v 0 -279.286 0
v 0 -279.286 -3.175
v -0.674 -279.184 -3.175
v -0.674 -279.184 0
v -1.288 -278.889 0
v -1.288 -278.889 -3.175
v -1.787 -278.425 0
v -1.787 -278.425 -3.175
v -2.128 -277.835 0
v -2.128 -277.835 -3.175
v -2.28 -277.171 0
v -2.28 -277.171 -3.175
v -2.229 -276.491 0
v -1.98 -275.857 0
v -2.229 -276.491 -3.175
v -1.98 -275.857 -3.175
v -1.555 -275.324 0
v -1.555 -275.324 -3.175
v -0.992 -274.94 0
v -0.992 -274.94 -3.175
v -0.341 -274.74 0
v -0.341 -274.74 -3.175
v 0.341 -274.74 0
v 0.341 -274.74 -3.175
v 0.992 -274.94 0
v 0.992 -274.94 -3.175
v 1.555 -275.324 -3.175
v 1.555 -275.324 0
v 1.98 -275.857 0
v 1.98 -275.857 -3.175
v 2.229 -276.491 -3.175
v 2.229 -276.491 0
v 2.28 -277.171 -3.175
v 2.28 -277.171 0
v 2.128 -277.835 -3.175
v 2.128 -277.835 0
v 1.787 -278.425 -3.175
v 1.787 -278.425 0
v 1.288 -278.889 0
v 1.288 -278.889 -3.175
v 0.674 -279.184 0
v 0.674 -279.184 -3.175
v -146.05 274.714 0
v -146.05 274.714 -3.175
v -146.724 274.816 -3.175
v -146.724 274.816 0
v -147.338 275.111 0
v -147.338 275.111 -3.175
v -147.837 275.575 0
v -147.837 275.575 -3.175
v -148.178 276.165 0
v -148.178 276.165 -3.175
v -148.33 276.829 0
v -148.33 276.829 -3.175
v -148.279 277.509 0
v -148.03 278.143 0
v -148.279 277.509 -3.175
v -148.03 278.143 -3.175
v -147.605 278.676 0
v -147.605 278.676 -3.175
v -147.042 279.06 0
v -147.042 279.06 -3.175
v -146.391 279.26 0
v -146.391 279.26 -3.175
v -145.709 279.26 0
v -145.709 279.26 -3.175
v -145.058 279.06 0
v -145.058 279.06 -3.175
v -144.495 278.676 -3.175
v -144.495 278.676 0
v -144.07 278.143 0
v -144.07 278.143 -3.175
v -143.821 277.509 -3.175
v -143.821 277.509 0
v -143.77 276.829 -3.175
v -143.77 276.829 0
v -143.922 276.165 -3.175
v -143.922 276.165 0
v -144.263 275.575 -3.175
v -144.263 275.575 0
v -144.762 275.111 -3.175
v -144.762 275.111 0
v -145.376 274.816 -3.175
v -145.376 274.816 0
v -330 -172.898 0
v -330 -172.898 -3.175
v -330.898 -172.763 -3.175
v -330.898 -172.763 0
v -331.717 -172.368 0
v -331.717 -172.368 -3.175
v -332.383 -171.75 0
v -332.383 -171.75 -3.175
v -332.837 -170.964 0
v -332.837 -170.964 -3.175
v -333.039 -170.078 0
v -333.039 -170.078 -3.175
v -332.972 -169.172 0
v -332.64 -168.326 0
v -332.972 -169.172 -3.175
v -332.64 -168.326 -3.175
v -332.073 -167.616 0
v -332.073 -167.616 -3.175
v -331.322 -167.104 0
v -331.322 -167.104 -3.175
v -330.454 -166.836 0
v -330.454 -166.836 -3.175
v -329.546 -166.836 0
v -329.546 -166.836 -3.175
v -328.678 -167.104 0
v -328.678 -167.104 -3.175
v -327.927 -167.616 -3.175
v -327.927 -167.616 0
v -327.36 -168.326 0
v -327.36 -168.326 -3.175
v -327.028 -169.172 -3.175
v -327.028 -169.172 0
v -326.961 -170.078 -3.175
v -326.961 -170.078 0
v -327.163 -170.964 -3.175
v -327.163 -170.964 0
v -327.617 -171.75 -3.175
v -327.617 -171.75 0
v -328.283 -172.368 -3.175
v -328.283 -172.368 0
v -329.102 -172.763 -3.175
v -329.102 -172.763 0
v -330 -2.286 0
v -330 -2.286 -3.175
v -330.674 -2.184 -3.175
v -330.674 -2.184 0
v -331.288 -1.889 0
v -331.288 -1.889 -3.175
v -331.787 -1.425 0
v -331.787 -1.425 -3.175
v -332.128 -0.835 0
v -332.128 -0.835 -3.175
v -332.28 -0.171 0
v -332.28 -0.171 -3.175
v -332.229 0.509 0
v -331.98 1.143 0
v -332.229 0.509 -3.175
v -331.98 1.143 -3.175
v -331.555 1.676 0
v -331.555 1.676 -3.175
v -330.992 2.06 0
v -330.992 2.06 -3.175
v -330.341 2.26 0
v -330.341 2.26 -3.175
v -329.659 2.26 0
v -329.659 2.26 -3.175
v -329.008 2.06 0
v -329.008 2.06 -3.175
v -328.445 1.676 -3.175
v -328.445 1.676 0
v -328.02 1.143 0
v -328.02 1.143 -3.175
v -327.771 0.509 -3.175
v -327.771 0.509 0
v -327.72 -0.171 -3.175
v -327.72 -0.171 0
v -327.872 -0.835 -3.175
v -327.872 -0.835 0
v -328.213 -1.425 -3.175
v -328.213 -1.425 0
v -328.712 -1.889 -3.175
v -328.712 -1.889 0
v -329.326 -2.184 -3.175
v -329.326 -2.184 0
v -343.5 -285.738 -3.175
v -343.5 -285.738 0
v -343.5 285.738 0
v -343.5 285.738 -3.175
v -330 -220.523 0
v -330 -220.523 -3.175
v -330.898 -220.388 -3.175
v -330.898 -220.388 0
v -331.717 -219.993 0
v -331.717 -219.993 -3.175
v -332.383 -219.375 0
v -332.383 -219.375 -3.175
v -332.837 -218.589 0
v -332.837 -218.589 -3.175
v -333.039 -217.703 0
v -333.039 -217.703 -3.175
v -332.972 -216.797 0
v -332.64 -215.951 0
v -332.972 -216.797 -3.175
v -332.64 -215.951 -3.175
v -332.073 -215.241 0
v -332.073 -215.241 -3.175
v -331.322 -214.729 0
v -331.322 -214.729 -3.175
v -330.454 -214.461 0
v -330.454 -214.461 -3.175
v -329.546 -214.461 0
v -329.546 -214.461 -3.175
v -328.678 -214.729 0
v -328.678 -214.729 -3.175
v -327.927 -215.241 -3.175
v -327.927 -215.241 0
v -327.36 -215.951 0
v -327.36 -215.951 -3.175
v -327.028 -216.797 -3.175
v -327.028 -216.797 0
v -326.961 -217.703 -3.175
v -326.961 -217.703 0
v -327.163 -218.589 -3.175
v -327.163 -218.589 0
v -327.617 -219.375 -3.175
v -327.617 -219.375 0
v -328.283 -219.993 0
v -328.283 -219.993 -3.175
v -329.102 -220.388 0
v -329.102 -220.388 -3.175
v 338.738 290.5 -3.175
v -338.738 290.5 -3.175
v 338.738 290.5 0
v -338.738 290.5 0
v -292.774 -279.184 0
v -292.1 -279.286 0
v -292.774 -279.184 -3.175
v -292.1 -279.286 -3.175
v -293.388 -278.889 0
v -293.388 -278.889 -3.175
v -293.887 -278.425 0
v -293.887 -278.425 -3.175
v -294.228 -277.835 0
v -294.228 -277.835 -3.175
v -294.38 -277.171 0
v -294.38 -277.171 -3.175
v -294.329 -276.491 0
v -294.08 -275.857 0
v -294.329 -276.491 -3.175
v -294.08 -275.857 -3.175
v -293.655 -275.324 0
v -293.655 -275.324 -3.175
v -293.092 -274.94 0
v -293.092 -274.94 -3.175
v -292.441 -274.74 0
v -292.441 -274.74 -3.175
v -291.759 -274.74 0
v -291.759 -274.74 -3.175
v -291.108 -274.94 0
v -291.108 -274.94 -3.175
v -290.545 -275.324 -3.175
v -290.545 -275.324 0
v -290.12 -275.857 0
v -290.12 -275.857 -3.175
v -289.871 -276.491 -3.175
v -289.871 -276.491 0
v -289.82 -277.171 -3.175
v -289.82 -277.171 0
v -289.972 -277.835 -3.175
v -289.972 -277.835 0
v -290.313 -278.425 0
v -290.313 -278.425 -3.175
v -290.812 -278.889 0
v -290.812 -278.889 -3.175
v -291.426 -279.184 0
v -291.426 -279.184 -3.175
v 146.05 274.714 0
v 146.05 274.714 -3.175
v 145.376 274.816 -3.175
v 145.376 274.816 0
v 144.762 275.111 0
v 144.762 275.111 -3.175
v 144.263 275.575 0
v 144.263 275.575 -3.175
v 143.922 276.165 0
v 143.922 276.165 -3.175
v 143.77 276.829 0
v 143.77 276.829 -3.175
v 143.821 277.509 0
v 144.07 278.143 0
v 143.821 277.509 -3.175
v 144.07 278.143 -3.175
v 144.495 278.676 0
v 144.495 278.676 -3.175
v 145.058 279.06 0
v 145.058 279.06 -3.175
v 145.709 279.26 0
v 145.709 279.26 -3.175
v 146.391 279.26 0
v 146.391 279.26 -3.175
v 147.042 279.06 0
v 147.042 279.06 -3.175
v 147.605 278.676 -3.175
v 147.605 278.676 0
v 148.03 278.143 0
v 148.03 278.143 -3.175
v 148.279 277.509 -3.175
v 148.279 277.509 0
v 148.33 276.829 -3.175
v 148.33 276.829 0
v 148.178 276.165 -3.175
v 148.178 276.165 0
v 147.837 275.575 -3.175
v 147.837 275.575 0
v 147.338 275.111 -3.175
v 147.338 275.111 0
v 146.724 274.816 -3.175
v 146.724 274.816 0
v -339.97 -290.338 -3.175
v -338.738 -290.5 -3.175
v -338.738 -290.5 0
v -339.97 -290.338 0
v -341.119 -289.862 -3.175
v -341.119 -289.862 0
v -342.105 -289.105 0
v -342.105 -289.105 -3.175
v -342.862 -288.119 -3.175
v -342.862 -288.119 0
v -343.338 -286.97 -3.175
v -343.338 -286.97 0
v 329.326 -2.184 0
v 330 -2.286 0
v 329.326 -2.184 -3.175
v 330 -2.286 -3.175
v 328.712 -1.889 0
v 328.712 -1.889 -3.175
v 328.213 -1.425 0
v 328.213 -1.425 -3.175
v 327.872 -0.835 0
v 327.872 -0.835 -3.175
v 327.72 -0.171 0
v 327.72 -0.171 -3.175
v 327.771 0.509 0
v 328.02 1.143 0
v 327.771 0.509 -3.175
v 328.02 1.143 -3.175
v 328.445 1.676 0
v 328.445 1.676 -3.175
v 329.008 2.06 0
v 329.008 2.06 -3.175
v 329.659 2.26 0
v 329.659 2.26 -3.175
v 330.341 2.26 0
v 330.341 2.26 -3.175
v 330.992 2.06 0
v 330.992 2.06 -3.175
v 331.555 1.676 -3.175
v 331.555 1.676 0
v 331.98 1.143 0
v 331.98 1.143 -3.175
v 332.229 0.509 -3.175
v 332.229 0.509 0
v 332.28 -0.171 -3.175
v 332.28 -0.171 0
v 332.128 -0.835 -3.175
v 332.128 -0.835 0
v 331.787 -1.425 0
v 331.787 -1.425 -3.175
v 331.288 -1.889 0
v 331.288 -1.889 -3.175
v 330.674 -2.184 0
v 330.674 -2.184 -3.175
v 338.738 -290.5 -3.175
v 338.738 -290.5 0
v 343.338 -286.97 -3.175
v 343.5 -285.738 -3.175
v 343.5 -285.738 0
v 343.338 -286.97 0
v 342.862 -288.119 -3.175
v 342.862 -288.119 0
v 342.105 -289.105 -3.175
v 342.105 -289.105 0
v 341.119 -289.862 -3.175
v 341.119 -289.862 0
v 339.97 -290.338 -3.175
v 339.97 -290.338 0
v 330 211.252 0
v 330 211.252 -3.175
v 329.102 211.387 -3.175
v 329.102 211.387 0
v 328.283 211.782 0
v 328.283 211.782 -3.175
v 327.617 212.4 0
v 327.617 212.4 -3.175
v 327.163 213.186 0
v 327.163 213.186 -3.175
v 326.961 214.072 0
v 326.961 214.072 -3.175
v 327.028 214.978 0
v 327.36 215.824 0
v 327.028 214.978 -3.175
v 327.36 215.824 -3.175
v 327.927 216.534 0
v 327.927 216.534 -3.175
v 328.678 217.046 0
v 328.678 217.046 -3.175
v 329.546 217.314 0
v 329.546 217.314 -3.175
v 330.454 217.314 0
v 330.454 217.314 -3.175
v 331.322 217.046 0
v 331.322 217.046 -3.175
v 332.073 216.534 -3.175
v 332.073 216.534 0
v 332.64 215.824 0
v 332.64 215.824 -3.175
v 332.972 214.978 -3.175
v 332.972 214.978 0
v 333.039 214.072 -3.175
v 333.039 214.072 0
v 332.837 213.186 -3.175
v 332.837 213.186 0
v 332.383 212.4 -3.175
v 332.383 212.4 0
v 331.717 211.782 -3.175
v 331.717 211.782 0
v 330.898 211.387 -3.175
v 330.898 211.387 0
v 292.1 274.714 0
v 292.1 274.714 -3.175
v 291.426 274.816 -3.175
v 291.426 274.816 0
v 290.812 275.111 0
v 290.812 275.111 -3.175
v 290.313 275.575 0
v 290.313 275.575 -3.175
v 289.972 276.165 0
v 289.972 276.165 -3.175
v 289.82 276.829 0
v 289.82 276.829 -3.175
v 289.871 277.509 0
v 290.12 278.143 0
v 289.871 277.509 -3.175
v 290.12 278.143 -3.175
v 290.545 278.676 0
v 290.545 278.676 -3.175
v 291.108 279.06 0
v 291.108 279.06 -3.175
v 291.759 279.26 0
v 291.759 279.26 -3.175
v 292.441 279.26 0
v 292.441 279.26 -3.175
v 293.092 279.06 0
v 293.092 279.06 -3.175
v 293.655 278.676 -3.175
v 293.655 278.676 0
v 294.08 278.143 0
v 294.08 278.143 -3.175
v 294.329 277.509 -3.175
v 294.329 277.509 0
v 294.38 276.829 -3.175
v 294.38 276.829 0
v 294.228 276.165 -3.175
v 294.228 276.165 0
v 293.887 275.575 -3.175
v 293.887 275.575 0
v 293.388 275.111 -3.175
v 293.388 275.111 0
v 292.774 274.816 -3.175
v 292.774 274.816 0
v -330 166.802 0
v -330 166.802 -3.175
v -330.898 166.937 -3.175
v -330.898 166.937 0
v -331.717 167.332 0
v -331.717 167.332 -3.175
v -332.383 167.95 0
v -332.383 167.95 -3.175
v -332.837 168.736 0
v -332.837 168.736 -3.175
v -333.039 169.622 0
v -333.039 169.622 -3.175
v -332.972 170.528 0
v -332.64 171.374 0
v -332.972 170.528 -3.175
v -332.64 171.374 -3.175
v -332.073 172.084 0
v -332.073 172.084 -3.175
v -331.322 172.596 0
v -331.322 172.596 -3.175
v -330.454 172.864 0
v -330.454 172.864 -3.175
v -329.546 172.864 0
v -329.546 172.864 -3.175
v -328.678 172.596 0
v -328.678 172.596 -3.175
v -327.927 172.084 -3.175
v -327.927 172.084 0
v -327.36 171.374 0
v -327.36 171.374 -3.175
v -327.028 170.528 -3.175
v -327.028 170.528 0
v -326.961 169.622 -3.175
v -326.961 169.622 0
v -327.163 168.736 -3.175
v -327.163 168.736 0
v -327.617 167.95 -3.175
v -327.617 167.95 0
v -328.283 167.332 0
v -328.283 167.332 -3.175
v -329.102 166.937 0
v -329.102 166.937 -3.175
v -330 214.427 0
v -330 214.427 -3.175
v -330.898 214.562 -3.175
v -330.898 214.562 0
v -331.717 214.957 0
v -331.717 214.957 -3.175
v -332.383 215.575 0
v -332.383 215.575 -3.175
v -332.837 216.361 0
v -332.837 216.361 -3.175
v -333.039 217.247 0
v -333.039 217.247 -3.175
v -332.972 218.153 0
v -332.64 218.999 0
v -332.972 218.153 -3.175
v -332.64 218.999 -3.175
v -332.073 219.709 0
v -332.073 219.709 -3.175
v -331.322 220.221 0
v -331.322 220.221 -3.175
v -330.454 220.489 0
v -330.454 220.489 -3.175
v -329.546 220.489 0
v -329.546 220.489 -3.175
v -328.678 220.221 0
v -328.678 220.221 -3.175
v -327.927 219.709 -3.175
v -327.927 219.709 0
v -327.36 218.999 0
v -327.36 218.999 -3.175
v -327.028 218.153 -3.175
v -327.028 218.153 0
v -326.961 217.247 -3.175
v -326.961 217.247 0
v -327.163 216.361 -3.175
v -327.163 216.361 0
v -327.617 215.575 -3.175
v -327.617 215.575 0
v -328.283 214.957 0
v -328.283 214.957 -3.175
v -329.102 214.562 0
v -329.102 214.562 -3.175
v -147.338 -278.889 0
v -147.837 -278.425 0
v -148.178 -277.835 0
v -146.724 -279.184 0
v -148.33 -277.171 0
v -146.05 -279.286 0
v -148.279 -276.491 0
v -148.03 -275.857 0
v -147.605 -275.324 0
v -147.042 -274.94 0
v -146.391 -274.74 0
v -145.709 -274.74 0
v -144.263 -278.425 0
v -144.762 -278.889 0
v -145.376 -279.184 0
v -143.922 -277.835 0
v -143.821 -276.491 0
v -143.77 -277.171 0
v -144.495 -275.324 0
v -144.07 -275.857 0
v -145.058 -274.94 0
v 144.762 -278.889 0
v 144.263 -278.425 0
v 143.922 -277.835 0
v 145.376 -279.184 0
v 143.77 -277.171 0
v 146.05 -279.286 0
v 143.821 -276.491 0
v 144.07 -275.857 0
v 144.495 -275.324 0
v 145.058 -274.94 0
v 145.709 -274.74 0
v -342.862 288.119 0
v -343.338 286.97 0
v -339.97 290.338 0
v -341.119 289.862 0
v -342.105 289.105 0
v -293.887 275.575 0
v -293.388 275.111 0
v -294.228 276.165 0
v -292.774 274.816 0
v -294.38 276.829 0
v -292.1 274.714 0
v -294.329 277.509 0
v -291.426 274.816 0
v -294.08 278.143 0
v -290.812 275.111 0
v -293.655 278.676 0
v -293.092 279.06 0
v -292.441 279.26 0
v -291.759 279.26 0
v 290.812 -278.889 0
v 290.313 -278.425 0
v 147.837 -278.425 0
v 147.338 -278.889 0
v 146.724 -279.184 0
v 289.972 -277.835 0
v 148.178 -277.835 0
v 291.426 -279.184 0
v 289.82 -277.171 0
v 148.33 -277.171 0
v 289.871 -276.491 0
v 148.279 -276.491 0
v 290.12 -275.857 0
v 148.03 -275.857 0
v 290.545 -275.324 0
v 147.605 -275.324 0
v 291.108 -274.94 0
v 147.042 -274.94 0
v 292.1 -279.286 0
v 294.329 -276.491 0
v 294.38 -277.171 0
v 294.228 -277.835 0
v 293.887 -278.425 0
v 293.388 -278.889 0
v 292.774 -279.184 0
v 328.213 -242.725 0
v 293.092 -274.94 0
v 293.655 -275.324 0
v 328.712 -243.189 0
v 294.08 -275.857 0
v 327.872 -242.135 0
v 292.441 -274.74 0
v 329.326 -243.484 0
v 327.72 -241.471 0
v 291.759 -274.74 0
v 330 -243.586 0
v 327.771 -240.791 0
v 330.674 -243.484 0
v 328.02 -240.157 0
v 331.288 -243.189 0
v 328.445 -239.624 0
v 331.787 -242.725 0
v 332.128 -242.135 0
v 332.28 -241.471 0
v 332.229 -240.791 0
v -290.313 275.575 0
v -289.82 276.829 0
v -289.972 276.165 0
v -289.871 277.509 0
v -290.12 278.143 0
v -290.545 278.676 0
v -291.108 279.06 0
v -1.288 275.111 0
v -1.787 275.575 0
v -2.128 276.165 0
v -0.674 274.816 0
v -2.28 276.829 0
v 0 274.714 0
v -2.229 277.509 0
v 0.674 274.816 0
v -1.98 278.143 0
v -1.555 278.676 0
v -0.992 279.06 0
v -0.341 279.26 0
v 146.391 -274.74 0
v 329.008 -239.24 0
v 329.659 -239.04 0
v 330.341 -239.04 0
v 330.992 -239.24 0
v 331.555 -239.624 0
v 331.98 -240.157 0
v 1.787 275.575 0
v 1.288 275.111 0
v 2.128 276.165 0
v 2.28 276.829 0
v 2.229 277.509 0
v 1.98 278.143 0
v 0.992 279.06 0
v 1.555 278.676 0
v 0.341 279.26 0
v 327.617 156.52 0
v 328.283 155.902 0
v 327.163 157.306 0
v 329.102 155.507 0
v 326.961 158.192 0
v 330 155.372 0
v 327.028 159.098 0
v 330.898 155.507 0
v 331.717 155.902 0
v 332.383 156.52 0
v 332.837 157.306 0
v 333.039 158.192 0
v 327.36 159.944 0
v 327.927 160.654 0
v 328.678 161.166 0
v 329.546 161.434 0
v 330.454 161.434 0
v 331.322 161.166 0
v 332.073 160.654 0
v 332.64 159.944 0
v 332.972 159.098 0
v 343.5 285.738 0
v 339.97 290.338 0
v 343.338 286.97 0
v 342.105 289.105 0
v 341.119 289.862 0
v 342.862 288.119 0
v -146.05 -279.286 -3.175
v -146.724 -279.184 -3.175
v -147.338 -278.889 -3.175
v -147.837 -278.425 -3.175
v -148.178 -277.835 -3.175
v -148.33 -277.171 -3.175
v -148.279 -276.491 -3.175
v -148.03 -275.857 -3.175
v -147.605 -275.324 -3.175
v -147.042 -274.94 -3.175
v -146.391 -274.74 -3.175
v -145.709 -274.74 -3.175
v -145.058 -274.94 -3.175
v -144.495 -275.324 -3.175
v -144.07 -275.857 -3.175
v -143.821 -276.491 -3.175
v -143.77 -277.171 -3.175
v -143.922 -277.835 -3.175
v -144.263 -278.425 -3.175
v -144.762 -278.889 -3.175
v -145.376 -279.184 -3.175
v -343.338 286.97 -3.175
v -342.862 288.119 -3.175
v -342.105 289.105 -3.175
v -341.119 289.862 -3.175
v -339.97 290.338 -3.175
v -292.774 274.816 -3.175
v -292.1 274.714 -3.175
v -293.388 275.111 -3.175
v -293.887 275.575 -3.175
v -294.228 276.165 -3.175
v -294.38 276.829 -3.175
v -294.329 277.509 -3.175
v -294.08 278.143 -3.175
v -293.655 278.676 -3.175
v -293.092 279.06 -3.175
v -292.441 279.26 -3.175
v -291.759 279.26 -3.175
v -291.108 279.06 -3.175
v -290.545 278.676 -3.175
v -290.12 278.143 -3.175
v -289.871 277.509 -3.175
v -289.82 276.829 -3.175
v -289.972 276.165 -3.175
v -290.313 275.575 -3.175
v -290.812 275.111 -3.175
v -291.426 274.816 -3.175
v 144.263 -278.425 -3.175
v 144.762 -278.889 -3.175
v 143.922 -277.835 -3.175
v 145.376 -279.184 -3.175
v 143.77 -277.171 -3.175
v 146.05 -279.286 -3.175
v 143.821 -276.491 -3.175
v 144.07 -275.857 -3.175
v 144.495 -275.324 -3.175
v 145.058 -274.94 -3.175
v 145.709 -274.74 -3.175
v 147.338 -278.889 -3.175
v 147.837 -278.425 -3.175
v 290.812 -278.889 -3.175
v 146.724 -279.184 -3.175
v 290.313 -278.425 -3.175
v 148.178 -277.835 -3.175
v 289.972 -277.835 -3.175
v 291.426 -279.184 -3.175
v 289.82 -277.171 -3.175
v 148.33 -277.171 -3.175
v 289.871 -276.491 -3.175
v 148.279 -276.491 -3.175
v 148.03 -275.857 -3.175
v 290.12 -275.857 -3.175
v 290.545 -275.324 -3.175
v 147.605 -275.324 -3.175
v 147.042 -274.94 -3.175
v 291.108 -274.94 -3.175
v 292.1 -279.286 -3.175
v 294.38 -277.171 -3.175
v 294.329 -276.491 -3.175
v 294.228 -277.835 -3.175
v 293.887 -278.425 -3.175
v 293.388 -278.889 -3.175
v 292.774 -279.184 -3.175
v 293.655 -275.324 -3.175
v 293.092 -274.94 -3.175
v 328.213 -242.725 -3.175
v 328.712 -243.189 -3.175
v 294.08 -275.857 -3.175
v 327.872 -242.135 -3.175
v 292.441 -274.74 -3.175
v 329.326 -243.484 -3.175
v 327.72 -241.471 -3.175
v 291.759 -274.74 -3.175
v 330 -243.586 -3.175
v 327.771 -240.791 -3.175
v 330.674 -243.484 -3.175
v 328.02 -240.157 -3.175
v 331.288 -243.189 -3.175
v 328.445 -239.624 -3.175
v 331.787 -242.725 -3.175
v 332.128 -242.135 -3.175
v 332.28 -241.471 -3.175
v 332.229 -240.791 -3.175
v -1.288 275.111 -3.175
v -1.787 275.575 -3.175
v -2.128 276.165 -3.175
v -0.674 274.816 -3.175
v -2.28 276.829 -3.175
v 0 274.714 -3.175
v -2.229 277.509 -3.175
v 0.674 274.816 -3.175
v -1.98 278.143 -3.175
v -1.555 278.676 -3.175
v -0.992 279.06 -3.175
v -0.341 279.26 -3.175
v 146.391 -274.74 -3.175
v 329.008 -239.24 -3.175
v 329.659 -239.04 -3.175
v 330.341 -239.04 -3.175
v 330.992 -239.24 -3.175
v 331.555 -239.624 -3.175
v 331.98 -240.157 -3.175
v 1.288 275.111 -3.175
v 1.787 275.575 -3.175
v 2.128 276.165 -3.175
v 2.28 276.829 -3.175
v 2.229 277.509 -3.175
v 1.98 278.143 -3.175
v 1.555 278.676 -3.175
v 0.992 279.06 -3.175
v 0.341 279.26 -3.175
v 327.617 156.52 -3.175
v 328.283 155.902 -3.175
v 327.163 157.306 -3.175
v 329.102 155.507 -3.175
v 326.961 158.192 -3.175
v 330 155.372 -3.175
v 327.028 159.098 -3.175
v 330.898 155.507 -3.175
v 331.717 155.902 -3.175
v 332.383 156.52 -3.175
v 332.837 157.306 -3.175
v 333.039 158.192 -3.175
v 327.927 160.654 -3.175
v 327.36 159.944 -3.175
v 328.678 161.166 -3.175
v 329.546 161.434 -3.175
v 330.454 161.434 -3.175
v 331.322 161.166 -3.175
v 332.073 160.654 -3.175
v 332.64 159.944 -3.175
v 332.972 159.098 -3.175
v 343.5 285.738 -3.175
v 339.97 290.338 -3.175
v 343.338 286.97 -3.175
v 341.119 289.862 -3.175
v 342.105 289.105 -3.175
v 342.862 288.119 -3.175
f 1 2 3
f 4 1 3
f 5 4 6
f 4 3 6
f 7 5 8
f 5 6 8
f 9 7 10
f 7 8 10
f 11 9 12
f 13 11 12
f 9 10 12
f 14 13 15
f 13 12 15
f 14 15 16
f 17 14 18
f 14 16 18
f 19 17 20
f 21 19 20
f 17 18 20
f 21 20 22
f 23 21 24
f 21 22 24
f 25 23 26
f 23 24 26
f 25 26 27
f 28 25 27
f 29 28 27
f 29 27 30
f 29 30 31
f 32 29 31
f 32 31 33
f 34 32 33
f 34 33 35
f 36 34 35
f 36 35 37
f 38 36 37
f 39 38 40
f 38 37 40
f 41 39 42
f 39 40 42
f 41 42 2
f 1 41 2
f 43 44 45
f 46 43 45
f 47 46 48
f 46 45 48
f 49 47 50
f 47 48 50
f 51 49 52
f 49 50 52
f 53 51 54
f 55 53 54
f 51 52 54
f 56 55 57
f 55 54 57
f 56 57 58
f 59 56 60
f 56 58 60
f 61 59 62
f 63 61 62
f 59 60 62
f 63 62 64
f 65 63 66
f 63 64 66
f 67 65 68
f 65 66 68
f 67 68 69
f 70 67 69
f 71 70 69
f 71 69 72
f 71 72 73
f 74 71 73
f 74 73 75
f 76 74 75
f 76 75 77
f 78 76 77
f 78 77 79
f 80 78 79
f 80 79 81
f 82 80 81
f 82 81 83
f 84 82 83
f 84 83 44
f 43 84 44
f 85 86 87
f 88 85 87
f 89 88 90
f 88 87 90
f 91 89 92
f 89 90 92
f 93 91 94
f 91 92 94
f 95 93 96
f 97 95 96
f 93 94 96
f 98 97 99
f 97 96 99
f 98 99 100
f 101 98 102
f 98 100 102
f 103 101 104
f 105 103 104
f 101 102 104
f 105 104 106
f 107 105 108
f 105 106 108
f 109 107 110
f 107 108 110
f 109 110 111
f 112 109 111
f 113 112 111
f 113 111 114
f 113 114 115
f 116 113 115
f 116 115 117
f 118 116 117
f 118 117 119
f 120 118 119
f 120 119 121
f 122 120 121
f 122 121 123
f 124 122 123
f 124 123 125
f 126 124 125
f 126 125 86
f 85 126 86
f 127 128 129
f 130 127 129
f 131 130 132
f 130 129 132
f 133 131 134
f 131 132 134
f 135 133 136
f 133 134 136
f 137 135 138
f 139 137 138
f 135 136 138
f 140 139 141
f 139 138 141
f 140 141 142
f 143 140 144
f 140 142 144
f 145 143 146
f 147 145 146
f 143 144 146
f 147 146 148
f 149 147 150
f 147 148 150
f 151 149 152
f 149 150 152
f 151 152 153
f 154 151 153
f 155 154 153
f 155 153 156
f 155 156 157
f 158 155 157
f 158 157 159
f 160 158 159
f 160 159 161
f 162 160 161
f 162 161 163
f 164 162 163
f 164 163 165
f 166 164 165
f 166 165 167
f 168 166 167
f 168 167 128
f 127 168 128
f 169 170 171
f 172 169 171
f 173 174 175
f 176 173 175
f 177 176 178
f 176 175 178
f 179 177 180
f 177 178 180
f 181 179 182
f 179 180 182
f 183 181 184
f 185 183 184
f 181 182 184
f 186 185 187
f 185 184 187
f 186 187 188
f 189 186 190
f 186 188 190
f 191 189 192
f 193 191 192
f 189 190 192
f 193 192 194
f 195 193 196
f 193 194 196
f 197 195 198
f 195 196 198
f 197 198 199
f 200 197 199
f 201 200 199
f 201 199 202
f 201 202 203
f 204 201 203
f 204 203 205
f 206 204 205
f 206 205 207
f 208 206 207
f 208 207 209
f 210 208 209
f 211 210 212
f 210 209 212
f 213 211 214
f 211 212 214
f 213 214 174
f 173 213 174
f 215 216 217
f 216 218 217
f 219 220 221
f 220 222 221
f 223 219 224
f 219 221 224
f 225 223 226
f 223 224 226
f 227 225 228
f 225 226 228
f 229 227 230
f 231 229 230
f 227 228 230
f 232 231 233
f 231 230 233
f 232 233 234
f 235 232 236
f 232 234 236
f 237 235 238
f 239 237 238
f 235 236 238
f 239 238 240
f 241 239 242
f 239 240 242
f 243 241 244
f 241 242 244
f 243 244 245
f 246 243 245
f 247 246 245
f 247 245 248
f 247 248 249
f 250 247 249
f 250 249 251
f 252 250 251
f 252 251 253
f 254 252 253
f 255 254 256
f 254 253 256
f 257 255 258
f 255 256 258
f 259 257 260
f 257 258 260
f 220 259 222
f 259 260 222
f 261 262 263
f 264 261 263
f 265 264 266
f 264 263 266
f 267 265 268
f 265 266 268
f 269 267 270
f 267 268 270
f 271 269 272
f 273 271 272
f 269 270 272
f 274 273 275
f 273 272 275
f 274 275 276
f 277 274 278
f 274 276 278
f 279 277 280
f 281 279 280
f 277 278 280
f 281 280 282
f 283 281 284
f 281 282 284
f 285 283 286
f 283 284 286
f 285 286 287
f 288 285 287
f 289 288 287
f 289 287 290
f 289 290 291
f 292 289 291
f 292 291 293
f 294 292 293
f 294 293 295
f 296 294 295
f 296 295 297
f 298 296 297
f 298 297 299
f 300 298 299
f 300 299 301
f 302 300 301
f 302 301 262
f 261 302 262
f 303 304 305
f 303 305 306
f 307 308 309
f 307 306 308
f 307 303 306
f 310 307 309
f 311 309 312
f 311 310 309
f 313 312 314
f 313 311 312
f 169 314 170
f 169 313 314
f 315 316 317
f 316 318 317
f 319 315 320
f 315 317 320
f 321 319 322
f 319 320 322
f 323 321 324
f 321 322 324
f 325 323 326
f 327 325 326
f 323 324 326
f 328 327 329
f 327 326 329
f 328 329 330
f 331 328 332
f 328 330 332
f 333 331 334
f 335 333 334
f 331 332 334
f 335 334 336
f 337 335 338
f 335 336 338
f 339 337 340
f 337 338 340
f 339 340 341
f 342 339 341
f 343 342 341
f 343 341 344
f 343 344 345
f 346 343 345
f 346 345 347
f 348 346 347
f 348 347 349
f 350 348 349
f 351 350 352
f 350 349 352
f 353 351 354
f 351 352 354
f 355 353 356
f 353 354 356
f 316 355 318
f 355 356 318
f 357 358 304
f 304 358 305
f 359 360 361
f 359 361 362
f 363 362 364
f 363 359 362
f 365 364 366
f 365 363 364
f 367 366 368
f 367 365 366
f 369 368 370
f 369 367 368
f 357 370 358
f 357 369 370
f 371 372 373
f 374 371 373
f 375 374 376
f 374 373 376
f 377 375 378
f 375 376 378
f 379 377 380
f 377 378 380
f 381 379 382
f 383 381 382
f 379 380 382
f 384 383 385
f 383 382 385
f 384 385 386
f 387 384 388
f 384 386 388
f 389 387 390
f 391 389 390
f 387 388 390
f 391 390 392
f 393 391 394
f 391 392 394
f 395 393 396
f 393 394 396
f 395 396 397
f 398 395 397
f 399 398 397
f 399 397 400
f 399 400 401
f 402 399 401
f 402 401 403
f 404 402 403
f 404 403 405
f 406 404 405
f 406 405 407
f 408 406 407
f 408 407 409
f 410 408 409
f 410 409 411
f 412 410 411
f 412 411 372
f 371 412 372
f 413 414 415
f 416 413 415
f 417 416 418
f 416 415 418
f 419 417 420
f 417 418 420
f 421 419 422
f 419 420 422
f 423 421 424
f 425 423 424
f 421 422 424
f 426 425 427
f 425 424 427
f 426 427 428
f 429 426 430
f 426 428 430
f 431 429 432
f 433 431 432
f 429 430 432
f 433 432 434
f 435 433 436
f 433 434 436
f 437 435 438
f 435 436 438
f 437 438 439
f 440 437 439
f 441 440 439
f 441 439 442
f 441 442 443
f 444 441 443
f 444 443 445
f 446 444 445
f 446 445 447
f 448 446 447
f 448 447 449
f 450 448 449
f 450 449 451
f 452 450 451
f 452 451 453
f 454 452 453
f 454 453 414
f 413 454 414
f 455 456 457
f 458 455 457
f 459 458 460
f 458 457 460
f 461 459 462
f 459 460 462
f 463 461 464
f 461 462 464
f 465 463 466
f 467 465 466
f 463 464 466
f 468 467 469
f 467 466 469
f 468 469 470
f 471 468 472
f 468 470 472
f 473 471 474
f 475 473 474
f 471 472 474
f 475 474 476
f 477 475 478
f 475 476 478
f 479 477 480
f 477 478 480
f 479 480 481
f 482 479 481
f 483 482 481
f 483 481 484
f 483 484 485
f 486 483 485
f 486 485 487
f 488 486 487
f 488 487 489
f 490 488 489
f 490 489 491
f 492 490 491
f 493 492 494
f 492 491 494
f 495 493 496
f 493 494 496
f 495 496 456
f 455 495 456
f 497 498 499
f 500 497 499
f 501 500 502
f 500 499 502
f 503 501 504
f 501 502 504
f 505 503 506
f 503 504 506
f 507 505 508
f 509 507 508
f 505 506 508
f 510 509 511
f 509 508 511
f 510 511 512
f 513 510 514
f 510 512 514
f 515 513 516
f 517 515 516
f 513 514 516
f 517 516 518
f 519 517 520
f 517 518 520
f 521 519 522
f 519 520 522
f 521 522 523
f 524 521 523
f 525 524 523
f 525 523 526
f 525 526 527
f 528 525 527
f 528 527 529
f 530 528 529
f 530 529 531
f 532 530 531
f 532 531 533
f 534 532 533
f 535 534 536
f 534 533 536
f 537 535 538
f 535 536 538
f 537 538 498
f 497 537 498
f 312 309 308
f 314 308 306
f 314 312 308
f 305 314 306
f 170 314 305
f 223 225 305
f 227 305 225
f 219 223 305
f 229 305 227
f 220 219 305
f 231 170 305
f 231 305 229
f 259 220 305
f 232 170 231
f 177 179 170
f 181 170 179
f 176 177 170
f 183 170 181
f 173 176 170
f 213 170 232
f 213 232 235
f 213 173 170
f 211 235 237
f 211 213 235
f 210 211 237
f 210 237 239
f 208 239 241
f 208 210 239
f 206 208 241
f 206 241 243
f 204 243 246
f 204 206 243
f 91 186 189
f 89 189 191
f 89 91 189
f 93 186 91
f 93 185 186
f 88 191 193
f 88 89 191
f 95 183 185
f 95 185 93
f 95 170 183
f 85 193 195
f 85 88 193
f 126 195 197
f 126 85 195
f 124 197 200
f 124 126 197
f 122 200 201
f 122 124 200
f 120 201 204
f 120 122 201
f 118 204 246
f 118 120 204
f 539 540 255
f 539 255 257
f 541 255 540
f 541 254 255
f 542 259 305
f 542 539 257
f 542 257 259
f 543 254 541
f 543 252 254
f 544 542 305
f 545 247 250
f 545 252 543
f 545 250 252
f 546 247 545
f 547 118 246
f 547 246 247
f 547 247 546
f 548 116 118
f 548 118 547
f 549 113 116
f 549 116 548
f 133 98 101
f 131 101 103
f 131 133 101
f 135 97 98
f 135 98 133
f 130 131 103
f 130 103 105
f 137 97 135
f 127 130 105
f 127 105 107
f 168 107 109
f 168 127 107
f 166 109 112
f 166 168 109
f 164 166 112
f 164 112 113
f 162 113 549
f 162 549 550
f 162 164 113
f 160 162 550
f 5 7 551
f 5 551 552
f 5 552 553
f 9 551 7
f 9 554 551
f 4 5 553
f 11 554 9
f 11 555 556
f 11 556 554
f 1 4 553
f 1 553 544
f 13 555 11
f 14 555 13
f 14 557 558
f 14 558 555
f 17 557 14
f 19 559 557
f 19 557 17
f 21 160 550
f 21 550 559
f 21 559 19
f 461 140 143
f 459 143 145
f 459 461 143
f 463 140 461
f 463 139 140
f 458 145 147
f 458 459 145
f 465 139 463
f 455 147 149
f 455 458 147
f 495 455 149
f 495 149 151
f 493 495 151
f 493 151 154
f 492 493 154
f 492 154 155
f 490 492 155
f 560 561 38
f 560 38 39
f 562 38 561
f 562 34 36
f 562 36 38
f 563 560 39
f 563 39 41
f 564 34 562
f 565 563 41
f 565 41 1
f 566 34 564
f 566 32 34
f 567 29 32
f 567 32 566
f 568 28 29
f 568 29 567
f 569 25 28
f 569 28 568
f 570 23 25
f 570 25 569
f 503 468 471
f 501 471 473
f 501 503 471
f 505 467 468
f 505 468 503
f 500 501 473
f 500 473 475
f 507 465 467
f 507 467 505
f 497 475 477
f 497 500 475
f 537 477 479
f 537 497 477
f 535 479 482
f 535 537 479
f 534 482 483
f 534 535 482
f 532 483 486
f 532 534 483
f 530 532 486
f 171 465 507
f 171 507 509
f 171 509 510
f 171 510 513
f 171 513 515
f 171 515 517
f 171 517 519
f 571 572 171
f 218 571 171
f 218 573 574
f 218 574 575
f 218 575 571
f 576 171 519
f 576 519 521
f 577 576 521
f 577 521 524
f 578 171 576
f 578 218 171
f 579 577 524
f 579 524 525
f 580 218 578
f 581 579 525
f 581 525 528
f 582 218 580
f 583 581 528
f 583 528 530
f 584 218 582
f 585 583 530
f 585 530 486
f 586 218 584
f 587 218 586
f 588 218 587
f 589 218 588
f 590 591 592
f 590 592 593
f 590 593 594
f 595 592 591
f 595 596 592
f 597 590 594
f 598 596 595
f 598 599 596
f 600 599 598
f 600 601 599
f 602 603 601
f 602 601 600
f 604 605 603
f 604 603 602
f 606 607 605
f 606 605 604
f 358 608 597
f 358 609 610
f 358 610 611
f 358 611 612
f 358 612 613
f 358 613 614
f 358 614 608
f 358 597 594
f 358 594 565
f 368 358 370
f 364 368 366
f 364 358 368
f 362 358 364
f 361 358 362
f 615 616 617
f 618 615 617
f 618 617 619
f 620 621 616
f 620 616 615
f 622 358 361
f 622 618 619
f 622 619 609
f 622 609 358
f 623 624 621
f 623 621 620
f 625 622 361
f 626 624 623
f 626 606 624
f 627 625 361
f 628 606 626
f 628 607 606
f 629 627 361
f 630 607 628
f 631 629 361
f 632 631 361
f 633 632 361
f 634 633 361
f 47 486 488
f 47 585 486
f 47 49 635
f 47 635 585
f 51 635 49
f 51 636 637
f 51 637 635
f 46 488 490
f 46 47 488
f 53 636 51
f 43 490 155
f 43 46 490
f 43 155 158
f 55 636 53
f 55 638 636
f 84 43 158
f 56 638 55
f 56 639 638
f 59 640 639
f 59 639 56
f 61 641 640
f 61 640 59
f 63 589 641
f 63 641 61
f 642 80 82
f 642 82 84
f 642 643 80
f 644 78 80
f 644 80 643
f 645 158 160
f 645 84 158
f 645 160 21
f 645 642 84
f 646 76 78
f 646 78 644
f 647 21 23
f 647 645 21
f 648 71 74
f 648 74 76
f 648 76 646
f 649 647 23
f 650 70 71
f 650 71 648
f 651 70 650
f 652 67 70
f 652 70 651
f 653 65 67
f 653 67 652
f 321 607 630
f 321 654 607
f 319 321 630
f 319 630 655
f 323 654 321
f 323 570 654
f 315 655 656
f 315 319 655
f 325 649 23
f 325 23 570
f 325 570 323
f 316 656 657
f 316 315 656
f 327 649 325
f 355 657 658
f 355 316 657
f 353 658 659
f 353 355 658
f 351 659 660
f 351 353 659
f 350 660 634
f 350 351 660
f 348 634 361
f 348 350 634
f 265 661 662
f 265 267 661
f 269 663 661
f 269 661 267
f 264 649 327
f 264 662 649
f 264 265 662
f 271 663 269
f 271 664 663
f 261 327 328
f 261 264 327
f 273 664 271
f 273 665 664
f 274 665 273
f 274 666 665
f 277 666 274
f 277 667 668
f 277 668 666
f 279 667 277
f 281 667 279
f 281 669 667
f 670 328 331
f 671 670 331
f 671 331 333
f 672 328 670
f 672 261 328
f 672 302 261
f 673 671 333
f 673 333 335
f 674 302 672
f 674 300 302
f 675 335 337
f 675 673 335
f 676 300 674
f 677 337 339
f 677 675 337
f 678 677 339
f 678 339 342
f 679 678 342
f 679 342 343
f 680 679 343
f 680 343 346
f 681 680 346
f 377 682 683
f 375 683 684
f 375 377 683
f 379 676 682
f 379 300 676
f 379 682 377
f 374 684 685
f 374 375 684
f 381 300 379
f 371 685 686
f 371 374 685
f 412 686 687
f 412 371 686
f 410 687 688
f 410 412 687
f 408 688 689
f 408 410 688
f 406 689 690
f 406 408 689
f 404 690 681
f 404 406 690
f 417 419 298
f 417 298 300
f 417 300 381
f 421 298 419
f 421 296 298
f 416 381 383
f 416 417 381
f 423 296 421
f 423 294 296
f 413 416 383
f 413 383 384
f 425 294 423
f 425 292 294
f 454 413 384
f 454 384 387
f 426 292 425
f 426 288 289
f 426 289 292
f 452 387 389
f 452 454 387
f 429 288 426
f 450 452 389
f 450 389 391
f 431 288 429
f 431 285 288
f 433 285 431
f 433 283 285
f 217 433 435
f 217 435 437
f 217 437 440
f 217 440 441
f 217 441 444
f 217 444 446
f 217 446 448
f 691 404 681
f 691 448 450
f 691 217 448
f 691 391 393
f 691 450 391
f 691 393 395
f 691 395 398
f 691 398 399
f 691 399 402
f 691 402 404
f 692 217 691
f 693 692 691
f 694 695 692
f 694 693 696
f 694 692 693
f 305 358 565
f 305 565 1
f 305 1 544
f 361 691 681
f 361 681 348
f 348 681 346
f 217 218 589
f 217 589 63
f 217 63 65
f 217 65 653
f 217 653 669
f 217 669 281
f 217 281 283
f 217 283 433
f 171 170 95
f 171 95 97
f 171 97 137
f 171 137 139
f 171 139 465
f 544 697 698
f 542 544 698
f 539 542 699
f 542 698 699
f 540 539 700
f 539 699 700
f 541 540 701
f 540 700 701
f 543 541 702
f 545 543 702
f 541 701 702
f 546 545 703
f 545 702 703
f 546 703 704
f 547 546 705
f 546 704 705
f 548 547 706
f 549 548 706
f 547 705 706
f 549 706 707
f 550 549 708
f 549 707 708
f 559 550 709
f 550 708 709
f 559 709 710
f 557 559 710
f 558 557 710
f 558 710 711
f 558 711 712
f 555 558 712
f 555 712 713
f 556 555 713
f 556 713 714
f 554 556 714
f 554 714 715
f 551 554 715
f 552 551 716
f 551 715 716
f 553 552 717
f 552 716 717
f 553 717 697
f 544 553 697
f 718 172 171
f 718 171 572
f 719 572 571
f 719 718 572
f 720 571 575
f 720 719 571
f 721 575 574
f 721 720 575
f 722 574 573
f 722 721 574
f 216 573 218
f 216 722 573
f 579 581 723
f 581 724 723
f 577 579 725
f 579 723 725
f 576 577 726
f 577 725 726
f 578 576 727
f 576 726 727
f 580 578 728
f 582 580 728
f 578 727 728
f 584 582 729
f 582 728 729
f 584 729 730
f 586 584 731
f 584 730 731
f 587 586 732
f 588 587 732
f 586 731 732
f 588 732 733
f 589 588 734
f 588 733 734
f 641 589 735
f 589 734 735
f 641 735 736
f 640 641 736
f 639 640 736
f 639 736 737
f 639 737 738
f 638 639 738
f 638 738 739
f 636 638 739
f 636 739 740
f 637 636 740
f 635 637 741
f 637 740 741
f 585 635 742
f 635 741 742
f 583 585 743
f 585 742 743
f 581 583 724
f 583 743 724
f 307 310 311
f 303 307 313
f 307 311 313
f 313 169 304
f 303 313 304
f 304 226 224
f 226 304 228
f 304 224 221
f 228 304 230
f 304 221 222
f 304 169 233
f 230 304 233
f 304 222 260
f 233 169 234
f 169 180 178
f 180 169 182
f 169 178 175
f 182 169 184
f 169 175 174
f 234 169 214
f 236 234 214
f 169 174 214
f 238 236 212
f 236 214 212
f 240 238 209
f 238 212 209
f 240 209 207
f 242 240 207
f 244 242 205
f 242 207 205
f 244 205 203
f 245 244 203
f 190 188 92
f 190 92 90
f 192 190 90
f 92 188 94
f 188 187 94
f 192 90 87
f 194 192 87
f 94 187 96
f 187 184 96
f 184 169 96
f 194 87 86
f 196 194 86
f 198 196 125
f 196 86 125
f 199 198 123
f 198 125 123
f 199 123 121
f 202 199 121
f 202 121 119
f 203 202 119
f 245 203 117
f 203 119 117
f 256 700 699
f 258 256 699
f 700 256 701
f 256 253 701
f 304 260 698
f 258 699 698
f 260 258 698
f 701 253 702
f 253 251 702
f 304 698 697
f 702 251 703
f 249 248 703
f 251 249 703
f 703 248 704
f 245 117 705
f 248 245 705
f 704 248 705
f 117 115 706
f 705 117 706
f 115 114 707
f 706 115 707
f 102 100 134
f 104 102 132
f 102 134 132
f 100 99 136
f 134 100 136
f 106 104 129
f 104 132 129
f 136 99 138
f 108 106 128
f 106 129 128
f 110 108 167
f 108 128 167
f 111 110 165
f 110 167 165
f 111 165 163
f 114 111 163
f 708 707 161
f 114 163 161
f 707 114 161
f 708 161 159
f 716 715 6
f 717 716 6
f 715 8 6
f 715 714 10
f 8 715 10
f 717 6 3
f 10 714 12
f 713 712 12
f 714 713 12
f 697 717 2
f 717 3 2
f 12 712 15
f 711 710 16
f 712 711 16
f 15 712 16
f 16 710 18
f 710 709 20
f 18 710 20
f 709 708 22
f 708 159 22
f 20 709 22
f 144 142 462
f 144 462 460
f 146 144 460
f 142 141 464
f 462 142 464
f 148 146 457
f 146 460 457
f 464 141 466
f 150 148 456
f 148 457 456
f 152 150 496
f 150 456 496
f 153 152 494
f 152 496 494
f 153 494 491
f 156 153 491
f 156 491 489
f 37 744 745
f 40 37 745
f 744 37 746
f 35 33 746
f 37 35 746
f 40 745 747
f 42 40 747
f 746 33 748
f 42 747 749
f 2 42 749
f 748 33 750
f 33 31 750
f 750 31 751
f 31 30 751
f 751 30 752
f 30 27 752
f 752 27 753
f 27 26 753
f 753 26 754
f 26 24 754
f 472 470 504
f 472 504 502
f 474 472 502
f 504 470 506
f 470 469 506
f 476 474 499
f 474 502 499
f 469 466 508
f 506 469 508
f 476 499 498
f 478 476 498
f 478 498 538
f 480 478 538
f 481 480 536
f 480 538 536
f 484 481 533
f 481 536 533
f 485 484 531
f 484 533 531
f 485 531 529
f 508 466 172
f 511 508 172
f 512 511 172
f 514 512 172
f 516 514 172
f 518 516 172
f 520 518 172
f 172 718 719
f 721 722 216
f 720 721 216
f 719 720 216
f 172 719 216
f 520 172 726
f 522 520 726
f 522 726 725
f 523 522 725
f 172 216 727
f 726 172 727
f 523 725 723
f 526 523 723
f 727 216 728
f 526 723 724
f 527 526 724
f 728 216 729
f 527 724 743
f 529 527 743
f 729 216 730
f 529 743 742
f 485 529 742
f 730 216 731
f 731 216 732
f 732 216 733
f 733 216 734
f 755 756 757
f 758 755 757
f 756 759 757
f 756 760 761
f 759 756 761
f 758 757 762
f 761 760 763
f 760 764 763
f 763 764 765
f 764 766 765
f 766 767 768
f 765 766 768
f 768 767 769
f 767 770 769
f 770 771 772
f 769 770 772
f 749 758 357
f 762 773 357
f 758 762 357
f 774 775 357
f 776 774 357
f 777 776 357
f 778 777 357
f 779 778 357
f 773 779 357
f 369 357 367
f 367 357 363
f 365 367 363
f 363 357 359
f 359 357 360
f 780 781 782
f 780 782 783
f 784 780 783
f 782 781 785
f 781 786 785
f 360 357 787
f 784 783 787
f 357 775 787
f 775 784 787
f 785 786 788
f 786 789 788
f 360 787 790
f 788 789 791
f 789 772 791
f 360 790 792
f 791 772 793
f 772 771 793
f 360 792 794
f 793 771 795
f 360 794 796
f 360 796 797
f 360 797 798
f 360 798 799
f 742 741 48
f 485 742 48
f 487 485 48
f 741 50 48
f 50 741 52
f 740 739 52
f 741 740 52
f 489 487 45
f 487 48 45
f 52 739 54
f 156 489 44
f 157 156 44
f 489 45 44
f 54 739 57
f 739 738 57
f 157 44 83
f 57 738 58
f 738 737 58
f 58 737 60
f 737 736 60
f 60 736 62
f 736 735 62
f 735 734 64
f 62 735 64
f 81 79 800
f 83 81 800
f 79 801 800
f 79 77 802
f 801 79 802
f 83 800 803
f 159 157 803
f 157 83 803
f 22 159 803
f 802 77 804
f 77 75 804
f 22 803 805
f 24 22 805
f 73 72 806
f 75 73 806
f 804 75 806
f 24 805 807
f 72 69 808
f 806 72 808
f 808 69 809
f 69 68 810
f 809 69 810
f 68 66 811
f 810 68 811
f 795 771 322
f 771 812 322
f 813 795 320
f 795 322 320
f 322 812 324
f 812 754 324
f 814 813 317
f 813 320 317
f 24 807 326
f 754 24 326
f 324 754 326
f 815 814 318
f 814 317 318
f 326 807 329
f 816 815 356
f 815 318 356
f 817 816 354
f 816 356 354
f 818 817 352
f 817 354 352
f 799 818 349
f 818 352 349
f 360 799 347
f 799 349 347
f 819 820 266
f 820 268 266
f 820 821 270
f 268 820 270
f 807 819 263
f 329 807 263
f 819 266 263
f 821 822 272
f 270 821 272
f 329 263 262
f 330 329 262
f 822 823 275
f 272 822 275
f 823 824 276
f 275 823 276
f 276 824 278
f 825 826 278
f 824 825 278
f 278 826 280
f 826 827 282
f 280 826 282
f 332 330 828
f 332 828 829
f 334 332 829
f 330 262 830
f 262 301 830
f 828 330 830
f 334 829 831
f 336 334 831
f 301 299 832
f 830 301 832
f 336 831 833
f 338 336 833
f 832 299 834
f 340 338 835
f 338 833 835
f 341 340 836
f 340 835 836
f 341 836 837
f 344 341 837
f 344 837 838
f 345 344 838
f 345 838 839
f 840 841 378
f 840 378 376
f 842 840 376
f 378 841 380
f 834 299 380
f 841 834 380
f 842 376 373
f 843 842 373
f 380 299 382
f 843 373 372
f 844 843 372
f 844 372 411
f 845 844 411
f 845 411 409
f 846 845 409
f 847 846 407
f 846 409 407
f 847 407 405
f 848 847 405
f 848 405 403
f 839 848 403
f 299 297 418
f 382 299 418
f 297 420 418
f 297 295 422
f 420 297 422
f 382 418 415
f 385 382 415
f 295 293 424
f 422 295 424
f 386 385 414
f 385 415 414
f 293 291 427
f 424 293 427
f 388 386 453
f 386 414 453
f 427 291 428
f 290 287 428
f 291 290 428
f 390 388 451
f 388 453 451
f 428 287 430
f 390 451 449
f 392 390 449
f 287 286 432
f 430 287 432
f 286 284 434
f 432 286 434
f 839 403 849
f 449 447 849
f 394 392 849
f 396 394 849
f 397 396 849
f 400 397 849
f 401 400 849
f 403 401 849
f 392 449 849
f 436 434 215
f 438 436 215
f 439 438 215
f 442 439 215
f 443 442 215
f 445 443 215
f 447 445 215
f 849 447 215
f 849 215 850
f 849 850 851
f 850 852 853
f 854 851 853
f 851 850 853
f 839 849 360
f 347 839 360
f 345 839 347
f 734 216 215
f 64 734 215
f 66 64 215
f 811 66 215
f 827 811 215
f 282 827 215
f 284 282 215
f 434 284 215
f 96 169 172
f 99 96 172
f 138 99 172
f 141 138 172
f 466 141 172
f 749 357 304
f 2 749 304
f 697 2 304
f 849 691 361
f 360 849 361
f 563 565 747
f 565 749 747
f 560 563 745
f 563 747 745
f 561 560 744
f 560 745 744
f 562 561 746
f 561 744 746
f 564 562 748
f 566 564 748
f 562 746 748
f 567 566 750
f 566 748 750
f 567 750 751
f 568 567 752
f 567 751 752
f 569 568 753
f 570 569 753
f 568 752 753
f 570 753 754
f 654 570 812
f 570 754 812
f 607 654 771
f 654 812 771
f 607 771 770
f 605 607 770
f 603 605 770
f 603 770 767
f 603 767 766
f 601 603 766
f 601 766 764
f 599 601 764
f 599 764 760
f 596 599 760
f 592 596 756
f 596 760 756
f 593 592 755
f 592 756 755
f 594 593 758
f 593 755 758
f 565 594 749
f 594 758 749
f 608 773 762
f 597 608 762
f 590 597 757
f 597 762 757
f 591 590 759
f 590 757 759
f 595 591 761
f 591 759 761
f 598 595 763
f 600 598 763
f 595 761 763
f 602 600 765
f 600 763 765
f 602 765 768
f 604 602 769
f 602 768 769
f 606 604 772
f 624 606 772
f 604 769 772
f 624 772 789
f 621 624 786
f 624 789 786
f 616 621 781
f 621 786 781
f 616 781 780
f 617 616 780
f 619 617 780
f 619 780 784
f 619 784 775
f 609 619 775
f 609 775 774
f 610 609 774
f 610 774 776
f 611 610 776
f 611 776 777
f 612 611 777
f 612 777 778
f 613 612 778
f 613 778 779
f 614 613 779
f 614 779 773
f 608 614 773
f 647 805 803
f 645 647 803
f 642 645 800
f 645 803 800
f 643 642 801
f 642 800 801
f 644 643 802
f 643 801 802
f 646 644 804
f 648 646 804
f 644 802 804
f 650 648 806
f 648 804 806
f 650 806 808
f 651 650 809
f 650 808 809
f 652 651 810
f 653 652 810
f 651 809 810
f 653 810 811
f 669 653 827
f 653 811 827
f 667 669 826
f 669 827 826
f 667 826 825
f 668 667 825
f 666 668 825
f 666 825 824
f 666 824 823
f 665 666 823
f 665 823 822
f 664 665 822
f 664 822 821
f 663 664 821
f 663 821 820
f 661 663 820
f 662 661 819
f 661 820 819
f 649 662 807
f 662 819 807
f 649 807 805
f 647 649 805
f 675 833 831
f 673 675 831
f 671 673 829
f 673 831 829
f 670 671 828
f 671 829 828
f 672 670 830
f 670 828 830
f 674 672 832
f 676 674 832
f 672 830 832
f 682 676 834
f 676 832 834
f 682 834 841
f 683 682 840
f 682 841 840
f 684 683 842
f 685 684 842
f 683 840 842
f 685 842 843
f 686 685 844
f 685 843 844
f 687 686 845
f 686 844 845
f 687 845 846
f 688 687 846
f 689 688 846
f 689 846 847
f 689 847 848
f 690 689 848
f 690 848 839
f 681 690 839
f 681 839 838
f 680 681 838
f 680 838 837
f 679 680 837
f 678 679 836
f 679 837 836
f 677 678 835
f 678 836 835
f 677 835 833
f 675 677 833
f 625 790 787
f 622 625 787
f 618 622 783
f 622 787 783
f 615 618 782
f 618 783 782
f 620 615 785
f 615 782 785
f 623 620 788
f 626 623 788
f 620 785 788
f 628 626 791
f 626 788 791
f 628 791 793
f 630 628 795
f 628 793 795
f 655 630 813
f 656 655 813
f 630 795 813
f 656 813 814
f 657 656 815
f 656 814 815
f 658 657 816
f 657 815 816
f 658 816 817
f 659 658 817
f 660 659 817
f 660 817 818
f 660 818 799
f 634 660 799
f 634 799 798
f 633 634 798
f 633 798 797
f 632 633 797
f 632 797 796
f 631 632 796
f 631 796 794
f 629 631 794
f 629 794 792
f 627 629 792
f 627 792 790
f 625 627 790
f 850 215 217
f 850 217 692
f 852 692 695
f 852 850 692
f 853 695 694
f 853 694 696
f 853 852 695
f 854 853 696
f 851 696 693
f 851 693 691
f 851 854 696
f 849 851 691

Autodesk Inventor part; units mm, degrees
ref_plane "YZ Plane" through (0, 0, 0) normal (1, 0, 0) x (0, 1, 0)
ref_plane "XZ Plane" through (0, 0, 0) normal (0, 1, 0) x (-1, 0, 0)
ref_plane "XY Plane" through (0, 0, 0) normal (0, 0, 1) x (1, 0, 0)
sketch "Sketch1" plane through (0, 0, 0) normal (0, 0, 1) x (1, 0, 0)
  line L0 (0, 406.7) -> (0, -406.7) projected
  line L1 (-480.9, 0) -> (480.9, 0) projected
  line L2 (343.5, -290.5) -> (-343.5, -290.5)
  line L3 (-343.5, -290.5) -> (-343.5, 290.5)
  line L4 (-343.5, 290.5) -> (343.5, 290.5)
  line L5 (343.5, 290.5) -> (343.5, -290.5)
  line L6 (343.5, -290.5) -> (-343.5, 290.5) construction
  line L7 (-343.5, -290.5) -> (343.5, 290.5) construction
  line L8 (330, -277) -> (-330, -277) construction
  line L9 (-330, -277) -> (-330, 277) construction
  line L10 (-330, 277) -> (330, 277) construction
  line L11 (330, 277) -> (330, -277) construction
  line L12 (330, -277) -> (-330, 277) construction
  line L13 (-330, -277) -> (330, 277) construction
  point P0 (0, 0)
  point P1 (-330, 217.475)
  point P2 (-330, 169.85)
  point P3 (-330, -217.475)
  point P4 (-330, -169.85)
  point P5 (330, 214.3)
  point P6 (330, 158.42)
  dimension "d0" = 687
  dimension "d1" = 581
  dimension "d2" = 660
  dimension "d3" = 554
  dimension "d4" = 47.625
  dimension "d5" = 73.025
  dimension "d6" = 47.625
  dimension "d7" = 73.025
  dimension "d8" = 76.2
  dimension "d9" = 55.88
extrude "Extrusion1" add sketch "Sketch1" against normal blind 3.175
hole "Hole1" at (-330, 217.475, 0) at (-330, 169.85, 0) at (-330, -217.475, 0) at (-330, -169.85, 0) at (330, 214.3, 0) at (330, 158.42, 0) direction (0, 0, -1) diameter 6.096 end through all
sketch "Sketch2" plane through (0, 0, 0) normal (0, 0, 1) x (1, 0, 0)
  line L0 (-330, -277) -> (-330, 277) construction
  line L1 (-330, 277) -> (330, 277) construction
  line L2 (330, 277) -> (330, -277) construction
  line L3 (330, -277) -> (-330, -277) construction
  line L4 (0, 406.7) -> (0, -406.7) projected
  line L5 (-480.9, 0) -> (480.9, 0) projected
  point P0 (0, 0)
  point P1 (-330, 241.3)
  point P2 (-292.1, 277)
  point P3 (292.1, 277)
  point P4 (0, 277)
  point P5 (-146.05, 277)
  point P6 (146.05, 277)
  point P7 (330, 241.3)
  point P8 (330, 120.65)
  point P9 (330, 0)
  point P10 (330, -120.65)
  point P11 (292.1, -277)
  point P12 (146.05, -277)
  point P13 (0, -277)
  point P14 (-146.05, -277)
  point P15 (-292.1, -277)
  point P16 (-330, -241.3)
  point P17 (-330, -120.65)
  point P18 (-330, 0)
  point P19 (-330, 120.65)
  point P20 (330, -241.3)
  dimension "d19" = 146.05
  dimension "d20" = 146.05
  dimension "d21" = 146.05
  dimension "d22" = 146.05
  dimension "d23" = 120.65
  dimension "d24" = 120.65
  dimension "d25" = 120.65
  dimension "d26" = 120.65
hole "Hole2" at (-292.1, 277, 0) at (-146.05, 277, 0) at (146.05, 277, 0) at (292.1, 277, 0) at (330, 0, 0) at (330, -241.3, 0) at (292.1, -277, 0) at (146.05, -277, 0) at (0, -277, 0) at (-146.05, -277, 0) at (-292.1, -277, 0) at (-330, 0, 0) at (0, 277, 0) direction (0, 0, -1) diameter 4.572 end through all
fillet "Fillet1" radius 4.7625 4 edges at (343.5, 290.5, -1.5875) (-343.5, 290.5, -1.5875) (343.5, -290.5, -1.5875) (-343.5, -290.5, -1.5875)
properties material "ACRYLIC, BLACK"
